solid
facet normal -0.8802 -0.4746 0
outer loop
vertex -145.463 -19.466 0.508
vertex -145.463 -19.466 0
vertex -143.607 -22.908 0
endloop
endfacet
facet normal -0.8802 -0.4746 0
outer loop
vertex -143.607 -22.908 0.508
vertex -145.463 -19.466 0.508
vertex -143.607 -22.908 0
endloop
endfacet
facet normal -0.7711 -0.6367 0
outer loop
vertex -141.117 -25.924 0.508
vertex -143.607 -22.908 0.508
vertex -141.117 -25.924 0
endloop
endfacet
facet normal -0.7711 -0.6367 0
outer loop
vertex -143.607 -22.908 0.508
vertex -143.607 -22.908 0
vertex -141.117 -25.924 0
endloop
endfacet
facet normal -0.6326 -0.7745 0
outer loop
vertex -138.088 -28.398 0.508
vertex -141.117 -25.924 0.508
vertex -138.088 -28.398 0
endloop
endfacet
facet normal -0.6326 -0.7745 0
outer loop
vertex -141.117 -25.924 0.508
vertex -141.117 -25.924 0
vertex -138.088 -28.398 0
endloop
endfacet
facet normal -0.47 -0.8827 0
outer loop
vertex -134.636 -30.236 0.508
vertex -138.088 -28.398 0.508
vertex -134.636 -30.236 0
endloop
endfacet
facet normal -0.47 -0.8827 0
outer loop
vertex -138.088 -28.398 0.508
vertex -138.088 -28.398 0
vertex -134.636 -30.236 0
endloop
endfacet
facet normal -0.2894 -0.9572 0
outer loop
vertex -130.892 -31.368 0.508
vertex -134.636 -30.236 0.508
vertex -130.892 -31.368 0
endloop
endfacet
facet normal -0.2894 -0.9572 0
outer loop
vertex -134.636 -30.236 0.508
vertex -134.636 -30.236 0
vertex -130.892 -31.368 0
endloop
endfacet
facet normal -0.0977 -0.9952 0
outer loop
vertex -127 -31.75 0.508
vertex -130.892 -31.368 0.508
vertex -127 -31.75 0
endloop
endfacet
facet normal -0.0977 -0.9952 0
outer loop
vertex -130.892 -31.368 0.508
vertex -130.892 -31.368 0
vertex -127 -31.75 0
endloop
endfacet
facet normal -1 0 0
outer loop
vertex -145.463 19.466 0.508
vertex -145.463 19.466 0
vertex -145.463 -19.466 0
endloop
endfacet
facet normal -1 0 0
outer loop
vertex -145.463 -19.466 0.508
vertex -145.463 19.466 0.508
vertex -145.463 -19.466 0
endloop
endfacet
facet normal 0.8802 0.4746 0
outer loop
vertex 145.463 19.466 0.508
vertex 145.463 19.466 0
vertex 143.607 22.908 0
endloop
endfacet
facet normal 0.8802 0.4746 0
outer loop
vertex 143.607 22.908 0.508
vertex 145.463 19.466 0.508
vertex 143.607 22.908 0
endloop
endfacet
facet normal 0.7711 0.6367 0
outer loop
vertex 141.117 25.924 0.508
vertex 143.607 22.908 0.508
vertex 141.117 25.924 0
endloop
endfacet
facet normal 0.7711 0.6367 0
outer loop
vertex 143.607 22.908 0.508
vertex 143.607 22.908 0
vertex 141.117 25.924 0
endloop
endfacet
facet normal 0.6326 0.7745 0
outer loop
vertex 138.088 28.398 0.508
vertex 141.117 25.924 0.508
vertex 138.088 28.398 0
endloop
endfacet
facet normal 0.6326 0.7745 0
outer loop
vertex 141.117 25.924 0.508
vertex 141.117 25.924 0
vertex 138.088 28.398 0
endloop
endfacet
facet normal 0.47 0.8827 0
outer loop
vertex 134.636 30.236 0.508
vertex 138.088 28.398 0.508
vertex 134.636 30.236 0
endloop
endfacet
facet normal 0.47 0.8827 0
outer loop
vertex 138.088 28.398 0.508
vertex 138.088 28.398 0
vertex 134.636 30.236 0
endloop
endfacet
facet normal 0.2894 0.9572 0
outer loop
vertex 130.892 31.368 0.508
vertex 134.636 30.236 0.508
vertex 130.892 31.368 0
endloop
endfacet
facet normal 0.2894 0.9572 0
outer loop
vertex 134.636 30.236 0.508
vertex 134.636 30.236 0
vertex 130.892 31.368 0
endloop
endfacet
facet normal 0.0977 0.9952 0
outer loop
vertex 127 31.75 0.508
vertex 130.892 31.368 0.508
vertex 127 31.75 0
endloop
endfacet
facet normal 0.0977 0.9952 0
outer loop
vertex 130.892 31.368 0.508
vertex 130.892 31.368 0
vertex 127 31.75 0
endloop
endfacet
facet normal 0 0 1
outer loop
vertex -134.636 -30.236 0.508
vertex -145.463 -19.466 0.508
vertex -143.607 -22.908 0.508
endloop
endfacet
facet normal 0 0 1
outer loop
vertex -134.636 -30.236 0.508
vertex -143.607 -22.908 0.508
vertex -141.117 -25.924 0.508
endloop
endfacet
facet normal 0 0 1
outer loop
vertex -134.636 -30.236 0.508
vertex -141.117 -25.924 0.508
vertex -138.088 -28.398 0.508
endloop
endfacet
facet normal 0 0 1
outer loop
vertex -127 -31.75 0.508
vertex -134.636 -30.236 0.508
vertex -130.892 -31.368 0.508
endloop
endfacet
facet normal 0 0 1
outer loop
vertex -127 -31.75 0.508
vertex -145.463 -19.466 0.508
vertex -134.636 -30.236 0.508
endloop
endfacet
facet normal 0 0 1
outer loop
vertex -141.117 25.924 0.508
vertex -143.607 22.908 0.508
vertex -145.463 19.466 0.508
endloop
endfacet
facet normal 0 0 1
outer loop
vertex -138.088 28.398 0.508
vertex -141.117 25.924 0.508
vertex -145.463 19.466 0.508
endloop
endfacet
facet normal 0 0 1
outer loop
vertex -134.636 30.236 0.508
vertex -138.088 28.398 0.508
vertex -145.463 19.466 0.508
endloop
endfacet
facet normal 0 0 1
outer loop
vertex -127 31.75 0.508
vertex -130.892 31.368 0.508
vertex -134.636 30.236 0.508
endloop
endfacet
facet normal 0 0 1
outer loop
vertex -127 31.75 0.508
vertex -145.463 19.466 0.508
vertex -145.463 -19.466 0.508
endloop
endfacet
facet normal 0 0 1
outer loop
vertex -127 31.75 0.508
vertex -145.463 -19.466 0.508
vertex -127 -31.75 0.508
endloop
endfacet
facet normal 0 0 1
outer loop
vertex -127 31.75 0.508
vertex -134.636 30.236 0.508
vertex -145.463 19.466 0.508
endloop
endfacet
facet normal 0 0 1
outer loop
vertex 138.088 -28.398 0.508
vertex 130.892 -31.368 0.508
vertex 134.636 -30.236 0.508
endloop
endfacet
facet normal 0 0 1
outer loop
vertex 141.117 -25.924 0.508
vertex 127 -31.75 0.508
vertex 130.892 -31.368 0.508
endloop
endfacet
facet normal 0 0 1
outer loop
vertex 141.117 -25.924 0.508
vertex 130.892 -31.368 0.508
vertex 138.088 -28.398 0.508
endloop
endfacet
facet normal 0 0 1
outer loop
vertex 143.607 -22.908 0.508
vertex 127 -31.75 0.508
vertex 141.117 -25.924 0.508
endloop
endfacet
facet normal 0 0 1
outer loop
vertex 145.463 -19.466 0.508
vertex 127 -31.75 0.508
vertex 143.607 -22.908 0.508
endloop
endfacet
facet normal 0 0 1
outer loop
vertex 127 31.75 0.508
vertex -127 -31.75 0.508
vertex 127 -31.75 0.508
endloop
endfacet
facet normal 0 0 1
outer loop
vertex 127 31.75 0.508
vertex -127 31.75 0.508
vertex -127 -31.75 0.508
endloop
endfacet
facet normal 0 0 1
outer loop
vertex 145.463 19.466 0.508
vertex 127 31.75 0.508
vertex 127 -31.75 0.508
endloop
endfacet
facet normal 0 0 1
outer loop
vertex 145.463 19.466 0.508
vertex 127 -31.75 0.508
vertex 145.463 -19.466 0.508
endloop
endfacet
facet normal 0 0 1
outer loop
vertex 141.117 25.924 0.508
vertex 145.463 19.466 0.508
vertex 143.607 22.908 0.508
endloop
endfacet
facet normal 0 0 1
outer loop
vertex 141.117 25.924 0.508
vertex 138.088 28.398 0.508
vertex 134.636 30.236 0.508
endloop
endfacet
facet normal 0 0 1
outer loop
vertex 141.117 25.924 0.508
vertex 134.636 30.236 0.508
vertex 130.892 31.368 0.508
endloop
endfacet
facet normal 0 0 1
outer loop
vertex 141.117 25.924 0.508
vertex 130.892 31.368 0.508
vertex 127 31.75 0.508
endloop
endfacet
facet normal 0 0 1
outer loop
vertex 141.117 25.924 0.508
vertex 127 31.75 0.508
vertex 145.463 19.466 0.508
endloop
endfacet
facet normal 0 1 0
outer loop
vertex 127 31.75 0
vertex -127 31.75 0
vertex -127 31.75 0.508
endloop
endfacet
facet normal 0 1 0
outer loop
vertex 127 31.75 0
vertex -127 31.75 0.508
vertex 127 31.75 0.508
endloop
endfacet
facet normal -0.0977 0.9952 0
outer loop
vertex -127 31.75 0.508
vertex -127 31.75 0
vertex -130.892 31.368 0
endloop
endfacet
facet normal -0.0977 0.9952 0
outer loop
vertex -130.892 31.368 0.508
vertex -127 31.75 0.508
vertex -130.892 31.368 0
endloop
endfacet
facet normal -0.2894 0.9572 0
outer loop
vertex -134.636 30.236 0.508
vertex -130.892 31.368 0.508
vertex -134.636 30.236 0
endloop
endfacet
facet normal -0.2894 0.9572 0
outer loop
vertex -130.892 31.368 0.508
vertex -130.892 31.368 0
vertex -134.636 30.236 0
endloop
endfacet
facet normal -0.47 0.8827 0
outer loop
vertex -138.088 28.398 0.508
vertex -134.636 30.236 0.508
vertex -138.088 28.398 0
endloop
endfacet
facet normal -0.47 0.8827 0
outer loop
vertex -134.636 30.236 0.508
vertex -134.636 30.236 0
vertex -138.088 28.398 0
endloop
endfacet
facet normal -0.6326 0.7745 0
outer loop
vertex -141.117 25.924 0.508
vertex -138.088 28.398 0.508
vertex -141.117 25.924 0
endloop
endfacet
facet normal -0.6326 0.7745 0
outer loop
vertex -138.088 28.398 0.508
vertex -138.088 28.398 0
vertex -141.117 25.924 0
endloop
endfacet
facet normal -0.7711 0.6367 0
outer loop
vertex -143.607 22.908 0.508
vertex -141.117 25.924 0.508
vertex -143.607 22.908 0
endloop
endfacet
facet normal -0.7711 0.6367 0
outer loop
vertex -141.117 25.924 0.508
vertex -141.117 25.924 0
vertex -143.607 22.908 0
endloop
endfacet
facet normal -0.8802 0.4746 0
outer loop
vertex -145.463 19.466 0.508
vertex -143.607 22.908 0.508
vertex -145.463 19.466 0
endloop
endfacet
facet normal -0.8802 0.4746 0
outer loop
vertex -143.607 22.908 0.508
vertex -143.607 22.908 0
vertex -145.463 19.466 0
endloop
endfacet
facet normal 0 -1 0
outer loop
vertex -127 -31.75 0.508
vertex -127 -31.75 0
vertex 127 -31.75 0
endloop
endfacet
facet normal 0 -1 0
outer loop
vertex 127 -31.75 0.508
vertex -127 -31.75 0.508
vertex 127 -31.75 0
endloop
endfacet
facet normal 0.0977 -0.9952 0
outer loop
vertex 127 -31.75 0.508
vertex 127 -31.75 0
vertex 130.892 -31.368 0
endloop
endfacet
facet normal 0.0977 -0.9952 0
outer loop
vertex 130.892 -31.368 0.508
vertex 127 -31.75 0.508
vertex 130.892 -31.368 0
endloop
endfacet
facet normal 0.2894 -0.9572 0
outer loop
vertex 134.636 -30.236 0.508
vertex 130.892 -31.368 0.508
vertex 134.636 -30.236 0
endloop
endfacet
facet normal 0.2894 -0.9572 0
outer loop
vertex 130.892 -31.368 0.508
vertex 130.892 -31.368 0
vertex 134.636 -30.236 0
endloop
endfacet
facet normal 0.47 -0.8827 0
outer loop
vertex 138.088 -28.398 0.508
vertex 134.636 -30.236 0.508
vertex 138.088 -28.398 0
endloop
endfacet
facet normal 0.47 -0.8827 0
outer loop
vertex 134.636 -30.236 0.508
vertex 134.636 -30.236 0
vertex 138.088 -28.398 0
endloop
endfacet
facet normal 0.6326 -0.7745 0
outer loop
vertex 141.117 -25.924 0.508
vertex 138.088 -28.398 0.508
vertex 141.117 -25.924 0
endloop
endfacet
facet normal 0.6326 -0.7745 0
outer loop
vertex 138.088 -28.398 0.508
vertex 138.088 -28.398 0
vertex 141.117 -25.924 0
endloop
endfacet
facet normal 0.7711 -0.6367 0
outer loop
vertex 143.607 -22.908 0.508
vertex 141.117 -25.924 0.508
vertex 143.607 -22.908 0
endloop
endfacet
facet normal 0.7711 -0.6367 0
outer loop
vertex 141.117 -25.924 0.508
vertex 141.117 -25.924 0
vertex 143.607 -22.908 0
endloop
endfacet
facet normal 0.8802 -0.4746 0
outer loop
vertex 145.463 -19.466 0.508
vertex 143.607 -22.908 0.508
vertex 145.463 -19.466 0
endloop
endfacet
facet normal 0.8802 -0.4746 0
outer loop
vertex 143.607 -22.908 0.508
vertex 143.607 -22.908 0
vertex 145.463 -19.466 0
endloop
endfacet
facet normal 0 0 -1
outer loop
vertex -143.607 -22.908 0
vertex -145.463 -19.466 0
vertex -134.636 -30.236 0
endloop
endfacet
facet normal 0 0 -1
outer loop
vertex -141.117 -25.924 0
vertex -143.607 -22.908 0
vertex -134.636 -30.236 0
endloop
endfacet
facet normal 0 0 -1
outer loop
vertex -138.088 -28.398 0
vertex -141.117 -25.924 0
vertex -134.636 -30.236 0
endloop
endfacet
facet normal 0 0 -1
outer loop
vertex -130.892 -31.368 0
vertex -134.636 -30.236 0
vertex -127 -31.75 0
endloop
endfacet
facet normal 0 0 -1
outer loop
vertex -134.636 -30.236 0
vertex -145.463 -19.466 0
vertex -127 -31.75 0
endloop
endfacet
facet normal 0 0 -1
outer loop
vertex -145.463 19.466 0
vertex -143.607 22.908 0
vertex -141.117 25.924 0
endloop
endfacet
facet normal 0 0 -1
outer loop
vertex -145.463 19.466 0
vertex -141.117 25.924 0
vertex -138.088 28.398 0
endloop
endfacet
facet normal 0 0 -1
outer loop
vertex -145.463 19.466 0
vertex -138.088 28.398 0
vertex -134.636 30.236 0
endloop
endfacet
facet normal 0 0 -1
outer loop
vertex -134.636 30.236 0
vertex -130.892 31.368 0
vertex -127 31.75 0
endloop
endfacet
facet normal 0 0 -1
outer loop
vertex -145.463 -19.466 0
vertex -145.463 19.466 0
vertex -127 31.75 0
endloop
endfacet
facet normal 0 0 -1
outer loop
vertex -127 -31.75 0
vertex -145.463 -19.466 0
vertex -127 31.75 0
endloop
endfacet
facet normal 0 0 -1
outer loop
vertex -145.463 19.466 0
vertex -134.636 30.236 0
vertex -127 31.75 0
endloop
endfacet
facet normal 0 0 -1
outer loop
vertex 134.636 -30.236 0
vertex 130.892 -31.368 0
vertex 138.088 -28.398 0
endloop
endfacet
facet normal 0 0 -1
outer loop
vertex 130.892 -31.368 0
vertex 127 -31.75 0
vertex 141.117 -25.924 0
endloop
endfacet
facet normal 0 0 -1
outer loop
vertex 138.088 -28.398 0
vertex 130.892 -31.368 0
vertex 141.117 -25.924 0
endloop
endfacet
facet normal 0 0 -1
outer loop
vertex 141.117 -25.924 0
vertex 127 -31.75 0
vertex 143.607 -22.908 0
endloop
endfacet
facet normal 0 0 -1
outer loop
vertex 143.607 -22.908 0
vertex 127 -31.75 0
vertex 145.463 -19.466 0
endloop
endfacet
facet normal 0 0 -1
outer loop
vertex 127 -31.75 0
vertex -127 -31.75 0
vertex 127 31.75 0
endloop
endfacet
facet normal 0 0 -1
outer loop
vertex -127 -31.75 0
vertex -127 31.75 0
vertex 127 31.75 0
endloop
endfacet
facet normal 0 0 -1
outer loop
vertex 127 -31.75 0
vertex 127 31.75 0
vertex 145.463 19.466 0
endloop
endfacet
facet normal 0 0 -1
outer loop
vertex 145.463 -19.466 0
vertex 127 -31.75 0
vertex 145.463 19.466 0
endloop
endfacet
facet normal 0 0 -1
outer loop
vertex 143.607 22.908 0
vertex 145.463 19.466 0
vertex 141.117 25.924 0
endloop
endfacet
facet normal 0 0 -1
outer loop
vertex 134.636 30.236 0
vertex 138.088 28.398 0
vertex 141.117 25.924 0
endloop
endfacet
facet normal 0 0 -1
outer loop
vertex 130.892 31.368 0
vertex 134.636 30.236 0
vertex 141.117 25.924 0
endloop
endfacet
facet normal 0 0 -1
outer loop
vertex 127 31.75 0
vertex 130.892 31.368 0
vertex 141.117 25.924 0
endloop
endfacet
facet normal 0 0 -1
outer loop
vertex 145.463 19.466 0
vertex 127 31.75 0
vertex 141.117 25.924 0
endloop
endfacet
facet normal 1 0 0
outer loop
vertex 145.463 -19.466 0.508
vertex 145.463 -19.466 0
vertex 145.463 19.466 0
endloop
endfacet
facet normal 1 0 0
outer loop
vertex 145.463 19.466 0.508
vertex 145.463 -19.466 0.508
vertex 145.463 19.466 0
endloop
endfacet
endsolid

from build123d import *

# Parameters (mm, degrees)
F0_W     = 254
F0_H     = 63.5
F1_DEPTH = 0.508


with BuildPart() as f1:
    # F0 (on Top) → F1 (new body)
    with BuildSketch(Plane.XY):
        Rectangle(F0_W, F0_H)
        with BuildLine():
            Line((127, 31.75), (127, -31.75))
            ThreePointArc((127, -31.75), (138.088261, -28.398354), (145.463377, -19.465789))
            Line((145.463377, -19.465789), (145.463377, 19.465789))
            ThreePointArc((145.463377, 19.465789), (138.088261, 28.398354), (127, 31.75))
        make_face()
        with BuildLine():
            ThreePointArc((-145.463377, -19.465789), (-138.088261, -28.398354), (-127, -31.75))
            Line((-127, -31.75), (-127, 31.75))
            ThreePointArc((-127, 31.75), (-138.088261, 28.398354), (-145.463377, 19.465789))
            Line((-145.463377, 19.465789), (-145.463377, -19.465789))
        make_face()
    extrude(amount=F1_DEPTH)


solid = f1.part
